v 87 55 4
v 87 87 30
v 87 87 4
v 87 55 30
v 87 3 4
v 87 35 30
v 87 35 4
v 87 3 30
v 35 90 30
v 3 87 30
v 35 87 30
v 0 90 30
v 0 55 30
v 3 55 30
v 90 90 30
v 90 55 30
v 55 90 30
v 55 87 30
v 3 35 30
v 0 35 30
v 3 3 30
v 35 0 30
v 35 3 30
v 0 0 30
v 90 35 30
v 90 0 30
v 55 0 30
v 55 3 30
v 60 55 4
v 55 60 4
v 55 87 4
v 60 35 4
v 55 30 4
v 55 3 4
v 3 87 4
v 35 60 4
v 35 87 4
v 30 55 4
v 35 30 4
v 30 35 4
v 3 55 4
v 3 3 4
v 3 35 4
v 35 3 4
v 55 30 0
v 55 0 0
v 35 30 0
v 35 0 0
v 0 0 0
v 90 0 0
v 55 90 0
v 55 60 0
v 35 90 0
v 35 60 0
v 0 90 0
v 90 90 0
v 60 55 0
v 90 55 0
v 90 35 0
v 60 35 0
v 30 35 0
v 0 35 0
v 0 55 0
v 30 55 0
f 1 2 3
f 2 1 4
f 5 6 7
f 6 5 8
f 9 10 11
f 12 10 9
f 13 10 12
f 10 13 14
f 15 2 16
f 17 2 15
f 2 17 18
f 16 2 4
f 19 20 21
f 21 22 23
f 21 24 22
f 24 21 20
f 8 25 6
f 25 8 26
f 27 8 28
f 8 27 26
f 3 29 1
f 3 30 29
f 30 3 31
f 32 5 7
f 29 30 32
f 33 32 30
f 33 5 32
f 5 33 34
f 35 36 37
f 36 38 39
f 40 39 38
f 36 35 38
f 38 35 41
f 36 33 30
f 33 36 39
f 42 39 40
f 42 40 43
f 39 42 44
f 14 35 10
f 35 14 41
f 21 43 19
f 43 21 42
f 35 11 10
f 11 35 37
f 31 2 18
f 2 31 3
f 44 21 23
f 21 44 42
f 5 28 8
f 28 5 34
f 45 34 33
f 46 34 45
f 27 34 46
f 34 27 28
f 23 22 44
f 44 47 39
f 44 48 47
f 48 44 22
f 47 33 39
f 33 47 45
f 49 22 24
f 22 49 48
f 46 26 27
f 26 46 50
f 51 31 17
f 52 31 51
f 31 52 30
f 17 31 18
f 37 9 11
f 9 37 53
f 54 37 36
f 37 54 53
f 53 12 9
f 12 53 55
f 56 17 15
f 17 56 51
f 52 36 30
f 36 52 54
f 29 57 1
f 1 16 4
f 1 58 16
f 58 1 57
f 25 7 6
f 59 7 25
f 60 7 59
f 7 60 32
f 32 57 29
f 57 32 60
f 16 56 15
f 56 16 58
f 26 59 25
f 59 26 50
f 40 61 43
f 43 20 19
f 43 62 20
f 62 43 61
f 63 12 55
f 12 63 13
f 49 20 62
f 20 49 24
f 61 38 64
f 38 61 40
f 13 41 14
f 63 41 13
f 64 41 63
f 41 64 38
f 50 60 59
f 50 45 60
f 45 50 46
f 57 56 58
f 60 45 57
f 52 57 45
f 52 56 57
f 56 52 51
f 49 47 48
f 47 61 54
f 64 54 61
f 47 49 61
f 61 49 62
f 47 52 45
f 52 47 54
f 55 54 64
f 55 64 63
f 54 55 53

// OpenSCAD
$fn=48;
translate([0,0,0])
{
difference()
{
    cube(size = [90.00, 90.00, 30.00], center = false); 
    translate(v = [3.00, 3.00, 4.00])
    {
        union()
        {
            union()
            {
                union()
                {
                    union()
                    {
                        cube(size = [84.00, 84.00, 26.00], center = false); 
                        translate(v = [32.00, -3.00, -20.00])
                        {
                            translate(v = [0.00, 0.00, 0.00])
                            {
                                cube(size = [20.00, 30.00, 46.00], center = false); 
                            }
                        }
                    }
                    translate(v = [32.00, 57.00, -20.00])
                    {
                        translate(v = [0.00, 0.00, 0.00])
                        {
                            cube(size = [20.00, 30.00, 46.00], center = false); 
                        }
                    }
                }
                translate(v = [87.00, 32.00, -20.00])
                {
                    rotate([0.00, 0.00, 90.00])
                    {
                        translate(v = [0.00, 0.00, 0.00])
                        {
                            cube(size = [20.00, 30.00, 46.00], center = false); 
                        }
                    }
                }
            }
            translate(v = [27.00, 32.00, -20.00])
            {
                rotate([0.00, 0.00, 90.00])
                {
                    translate(v = [0.00, 0.00, 0.00])
                    {
                        cube(size = [20.00, 30.00, 46.00], center = false); 
                    }
                }
            }
        }
    }
}

}
